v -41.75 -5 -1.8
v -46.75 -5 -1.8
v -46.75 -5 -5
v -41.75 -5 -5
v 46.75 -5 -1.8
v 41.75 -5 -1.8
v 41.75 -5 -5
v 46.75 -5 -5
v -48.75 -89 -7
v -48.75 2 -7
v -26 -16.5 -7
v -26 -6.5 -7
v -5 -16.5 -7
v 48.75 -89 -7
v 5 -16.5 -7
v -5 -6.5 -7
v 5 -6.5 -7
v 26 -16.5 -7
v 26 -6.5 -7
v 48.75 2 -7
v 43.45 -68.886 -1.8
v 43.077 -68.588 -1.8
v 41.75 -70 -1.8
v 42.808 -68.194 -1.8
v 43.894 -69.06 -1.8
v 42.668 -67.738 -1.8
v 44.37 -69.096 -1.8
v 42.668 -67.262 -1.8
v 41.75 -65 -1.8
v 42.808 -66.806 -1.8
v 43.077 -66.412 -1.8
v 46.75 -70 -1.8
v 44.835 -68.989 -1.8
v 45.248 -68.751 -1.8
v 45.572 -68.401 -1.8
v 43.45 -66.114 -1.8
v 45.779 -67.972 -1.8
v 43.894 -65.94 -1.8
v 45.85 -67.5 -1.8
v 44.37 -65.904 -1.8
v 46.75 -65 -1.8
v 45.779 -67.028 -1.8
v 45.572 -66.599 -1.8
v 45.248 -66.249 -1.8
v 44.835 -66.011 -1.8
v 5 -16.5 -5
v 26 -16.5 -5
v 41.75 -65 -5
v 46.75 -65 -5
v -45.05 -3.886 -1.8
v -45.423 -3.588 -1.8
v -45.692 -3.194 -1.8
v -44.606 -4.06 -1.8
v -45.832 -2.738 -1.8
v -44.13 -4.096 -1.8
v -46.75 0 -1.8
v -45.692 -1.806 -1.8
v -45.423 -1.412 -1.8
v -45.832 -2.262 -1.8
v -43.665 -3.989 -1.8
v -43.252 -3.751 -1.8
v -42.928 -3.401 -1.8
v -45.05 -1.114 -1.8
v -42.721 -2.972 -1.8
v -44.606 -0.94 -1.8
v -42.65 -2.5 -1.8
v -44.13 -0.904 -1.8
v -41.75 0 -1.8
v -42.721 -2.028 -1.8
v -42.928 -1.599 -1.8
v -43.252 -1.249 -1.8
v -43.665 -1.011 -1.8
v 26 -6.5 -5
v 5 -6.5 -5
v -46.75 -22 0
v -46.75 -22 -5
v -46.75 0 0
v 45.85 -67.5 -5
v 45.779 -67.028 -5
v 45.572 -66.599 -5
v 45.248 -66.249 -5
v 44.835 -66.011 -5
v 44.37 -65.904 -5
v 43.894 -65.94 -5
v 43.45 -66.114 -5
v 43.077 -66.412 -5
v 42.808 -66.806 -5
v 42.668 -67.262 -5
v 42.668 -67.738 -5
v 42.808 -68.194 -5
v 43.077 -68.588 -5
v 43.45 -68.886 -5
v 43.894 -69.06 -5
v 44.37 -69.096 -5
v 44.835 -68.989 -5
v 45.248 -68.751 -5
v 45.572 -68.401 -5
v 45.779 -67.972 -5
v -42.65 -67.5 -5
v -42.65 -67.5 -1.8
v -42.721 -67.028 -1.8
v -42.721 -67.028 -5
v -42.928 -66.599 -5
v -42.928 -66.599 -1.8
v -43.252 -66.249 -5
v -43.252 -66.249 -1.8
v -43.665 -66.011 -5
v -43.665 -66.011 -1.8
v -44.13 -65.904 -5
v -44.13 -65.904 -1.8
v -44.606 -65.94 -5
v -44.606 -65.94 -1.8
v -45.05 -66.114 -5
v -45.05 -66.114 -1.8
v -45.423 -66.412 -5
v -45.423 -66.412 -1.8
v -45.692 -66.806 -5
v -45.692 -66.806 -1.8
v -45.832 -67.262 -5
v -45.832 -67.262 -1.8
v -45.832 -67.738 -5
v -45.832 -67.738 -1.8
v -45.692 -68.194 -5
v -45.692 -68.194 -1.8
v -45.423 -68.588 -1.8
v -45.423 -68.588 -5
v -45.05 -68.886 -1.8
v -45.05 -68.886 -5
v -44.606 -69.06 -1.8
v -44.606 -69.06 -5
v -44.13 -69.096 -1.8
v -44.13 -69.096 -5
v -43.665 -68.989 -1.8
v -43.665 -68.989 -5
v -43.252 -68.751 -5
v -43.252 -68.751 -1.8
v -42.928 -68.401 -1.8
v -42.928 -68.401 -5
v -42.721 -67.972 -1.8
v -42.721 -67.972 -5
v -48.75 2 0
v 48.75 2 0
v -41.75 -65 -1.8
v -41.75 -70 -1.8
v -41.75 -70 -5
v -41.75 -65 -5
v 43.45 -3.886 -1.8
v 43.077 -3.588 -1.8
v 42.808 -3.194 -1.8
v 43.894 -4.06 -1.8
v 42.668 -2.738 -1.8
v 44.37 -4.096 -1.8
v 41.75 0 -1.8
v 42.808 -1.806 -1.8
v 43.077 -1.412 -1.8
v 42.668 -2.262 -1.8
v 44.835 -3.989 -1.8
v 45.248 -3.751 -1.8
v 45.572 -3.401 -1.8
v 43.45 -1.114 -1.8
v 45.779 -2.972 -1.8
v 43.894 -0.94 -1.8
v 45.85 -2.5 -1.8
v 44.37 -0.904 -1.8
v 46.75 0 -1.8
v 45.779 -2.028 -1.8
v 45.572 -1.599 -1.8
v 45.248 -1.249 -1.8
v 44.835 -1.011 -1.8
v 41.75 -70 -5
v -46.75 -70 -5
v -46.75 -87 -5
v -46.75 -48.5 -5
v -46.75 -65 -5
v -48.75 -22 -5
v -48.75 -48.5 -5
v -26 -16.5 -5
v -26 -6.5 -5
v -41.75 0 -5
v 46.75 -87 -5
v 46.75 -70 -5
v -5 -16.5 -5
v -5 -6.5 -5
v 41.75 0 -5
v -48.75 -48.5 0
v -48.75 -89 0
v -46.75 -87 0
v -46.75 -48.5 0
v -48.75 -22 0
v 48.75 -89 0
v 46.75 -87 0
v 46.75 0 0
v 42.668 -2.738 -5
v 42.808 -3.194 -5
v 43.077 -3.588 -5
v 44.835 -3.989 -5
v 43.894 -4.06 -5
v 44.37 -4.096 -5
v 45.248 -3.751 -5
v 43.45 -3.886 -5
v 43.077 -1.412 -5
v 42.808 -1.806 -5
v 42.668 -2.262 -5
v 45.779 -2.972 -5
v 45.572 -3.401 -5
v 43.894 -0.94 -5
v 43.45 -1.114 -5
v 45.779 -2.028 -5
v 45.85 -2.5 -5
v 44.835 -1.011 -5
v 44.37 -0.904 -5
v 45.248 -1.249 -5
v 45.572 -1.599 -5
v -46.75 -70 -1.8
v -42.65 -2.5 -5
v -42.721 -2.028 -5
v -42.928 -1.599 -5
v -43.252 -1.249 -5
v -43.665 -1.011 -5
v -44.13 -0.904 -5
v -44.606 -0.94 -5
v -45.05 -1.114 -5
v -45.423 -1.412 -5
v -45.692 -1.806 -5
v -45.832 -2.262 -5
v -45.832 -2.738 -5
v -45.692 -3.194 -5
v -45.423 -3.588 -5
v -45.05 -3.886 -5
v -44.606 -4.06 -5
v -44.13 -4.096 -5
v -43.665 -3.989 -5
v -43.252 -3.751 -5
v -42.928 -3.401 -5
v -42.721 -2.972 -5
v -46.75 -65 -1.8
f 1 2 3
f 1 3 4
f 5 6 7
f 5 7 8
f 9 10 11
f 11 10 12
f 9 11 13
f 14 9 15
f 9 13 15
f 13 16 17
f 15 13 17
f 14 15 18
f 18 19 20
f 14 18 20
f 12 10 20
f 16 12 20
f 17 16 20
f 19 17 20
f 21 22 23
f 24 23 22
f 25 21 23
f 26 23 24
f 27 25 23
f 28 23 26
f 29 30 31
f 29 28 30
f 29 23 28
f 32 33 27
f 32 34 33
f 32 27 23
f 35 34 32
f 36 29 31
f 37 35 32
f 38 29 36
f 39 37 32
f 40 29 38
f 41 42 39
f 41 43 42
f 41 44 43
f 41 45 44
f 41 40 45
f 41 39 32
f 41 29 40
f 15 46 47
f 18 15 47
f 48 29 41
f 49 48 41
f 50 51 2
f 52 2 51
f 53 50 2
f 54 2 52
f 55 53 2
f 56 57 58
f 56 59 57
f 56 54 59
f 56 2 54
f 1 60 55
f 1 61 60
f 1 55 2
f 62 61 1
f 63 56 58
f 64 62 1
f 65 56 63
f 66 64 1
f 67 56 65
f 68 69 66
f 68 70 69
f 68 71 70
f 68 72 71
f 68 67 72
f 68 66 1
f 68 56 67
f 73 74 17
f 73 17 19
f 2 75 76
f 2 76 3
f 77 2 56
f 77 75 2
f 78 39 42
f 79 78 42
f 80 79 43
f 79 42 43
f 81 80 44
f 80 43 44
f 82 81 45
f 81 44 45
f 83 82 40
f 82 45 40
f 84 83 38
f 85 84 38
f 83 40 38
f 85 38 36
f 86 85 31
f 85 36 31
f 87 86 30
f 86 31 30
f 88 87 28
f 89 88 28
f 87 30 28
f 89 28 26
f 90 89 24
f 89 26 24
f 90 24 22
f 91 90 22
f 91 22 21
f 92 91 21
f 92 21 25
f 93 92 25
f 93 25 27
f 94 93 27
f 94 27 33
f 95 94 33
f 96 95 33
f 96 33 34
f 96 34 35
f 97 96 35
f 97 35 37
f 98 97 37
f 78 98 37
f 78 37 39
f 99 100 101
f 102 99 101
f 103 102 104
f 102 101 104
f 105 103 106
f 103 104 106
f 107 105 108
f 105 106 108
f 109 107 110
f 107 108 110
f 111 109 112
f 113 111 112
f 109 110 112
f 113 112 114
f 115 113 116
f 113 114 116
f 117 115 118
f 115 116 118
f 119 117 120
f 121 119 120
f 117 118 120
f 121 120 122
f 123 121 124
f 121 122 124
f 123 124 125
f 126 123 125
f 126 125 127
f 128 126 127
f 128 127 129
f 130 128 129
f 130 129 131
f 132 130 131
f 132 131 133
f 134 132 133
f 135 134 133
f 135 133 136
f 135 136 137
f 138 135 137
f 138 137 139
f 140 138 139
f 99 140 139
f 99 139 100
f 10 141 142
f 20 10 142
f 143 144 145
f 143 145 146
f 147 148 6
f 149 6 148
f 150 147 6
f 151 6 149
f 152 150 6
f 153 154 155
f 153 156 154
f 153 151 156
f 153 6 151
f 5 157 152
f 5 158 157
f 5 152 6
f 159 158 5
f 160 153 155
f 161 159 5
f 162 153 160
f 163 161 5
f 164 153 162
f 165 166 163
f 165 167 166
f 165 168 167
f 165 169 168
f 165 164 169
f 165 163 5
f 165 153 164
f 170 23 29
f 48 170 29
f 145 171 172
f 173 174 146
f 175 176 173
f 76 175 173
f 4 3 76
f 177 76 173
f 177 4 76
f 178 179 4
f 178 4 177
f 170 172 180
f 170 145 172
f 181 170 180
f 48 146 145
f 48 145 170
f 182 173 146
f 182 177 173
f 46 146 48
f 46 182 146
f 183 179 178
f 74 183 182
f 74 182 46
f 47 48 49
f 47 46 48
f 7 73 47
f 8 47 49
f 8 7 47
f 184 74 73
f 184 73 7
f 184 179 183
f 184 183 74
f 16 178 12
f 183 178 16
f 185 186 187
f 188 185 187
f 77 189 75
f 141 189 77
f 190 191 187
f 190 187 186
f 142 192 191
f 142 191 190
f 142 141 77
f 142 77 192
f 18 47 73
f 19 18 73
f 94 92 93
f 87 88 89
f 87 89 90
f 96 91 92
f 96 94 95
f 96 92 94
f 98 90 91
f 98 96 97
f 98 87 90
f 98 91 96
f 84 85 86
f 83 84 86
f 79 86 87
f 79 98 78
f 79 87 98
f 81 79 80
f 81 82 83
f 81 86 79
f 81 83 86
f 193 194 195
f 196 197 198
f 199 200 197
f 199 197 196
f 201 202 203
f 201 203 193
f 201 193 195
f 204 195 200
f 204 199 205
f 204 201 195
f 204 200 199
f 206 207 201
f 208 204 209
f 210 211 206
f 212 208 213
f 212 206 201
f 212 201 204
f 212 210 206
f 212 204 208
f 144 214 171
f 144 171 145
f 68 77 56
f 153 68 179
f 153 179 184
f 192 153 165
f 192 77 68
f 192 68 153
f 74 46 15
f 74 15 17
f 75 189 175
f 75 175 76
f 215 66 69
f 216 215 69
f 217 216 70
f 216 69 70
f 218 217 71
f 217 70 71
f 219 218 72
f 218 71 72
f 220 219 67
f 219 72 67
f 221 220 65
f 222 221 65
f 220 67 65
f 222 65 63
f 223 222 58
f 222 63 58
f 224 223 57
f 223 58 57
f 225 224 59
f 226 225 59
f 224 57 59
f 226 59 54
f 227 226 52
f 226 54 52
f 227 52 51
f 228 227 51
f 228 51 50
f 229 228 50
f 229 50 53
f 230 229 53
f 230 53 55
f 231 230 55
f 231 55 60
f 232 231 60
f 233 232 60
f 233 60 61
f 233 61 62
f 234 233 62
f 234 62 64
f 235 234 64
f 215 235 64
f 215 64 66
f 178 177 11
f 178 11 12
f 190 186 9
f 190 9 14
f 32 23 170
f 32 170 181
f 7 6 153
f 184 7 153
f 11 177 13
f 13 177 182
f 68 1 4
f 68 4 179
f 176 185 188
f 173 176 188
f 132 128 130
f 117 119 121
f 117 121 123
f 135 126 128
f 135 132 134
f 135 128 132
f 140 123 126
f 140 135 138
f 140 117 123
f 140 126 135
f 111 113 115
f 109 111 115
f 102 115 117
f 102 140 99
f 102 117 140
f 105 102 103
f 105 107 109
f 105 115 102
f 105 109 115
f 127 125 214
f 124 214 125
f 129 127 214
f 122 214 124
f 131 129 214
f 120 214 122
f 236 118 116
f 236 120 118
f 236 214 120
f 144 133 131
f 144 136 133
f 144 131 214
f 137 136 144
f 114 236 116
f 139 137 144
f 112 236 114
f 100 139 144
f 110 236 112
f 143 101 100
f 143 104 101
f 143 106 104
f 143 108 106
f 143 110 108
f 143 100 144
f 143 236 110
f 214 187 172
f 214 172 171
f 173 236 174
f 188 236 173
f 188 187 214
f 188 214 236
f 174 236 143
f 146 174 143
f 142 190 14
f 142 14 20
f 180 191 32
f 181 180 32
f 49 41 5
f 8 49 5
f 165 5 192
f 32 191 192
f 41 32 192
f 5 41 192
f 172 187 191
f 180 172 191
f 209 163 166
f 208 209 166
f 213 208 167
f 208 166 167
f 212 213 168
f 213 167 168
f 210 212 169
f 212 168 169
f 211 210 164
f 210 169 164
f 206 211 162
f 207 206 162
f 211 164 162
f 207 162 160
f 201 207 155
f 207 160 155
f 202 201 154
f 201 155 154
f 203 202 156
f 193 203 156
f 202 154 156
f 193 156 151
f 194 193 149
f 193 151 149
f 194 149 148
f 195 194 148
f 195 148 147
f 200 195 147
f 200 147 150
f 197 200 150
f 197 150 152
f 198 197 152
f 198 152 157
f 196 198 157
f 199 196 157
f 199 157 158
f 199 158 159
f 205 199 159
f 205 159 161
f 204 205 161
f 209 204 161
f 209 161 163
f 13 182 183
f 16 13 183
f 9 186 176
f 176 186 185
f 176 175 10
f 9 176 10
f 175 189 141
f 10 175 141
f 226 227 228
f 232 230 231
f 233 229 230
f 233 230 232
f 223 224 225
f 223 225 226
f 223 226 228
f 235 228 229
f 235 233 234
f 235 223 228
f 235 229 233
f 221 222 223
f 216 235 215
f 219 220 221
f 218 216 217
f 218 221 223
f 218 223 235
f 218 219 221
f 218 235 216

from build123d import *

# Parameters (mm, degrees)
SKETCH001_W     = 97.5
SKETCH001_H     = 91
PAD_DEPTH       = 7
SKETCH_W        = 93.5
SKETCH_H        = 87
POCKET_DEPTH    = 5
SKETCH002_W     = 5
SKETCH002_H     = 5
SKETCH002_R     = 1.6
PAD001_DEPTH    = 5
POCKET001_DEPTH = 1.8
SKETCH003_W     = 10
SKETCH003_H     = 26.5
POCKET002_DEPTH = 5
SKETCH004_W     = 21
SKETCH004_H     = 10
POCKET003_DEPTH = 7.001


with BuildPart() as part:
    # Sketch001 → Pad (new body)
    with BuildSketch(Plane.XY):
        with Locations((0, -43.5)):
            Rectangle(SKETCH001_W, SKETCH001_H)
    extrude(amount=-PAD_DEPTH)

    # Sketch → Pocket (cut)
    with BuildSketch(Plane.XY):
        with Locations((0, -43.5)):
            Rectangle(SKETCH_W, SKETCH_H)
    extrude(amount=-POCKET_DEPTH, mode=Mode.SUBTRACT)

    # Sketch002 → Pad001 (join)
    with BuildSketch(Plane.XY):
        with Locations((-44.25, -2.5)):
            Rectangle(SKETCH002_W, SKETCH002_H)
        with Locations((-44.25, -2.5)):
            Circle(SKETCH002_R, mode=Mode.SUBTRACT)
        with Locations((-44.25, -67.5)):
            Rectangle(SKETCH002_W, SKETCH002_H)
        with Locations((-44.25, -67.5)):
            Circle(SKETCH002_R, mode=Mode.SUBTRACT)
        with Locations((44.25, -67.5)):
            Rectangle(SKETCH002_W, SKETCH002_H)
        with Locations((44.25, -67.5)):
            Circle(SKETCH002_R, mode=Mode.SUBTRACT)
        with Locations((44.25, -2.5)):
            Rectangle(SKETCH002_W, SKETCH002_H)
        with Locations((44.25, -2.5)):
            Circle(SKETCH002_R, mode=Mode.SUBTRACT)
    extrude(amount=-PAD001_DEPTH)

    # Sketch → Pocket001 (cut)
    with BuildSketch(Plane.XY):
        with Locations((0, -43.5)):
            Rectangle(SKETCH_W, SKETCH_H)
    extrude(amount=-POCKET001_DEPTH, mode=Mode.SUBTRACT)

    # Sketch003 → Pocket002 (cut)
    with BuildSketch(Plane.XY):
        with Locations((-51.75, -35.25)):
            Rectangle(SKETCH003_W, SKETCH003_H)
    extrude(amount=-POCKET002_DEPTH, mode=Mode.SUBTRACT)

    # Sketch004 → Pocket003 (cut, through all)
    with BuildSketch(Plane.XY):
        with Locations((-15.5, -11.5)):
            Rectangle(SKETCH004_W, SKETCH004_H)
        with Locations((15.5, -11.5)):
            Rectangle(SKETCH004_W, SKETCH004_H)
    extrude(amount=-POCKET003_DEPTH, mode=Mode.SUBTRACT)


solid = part.part
